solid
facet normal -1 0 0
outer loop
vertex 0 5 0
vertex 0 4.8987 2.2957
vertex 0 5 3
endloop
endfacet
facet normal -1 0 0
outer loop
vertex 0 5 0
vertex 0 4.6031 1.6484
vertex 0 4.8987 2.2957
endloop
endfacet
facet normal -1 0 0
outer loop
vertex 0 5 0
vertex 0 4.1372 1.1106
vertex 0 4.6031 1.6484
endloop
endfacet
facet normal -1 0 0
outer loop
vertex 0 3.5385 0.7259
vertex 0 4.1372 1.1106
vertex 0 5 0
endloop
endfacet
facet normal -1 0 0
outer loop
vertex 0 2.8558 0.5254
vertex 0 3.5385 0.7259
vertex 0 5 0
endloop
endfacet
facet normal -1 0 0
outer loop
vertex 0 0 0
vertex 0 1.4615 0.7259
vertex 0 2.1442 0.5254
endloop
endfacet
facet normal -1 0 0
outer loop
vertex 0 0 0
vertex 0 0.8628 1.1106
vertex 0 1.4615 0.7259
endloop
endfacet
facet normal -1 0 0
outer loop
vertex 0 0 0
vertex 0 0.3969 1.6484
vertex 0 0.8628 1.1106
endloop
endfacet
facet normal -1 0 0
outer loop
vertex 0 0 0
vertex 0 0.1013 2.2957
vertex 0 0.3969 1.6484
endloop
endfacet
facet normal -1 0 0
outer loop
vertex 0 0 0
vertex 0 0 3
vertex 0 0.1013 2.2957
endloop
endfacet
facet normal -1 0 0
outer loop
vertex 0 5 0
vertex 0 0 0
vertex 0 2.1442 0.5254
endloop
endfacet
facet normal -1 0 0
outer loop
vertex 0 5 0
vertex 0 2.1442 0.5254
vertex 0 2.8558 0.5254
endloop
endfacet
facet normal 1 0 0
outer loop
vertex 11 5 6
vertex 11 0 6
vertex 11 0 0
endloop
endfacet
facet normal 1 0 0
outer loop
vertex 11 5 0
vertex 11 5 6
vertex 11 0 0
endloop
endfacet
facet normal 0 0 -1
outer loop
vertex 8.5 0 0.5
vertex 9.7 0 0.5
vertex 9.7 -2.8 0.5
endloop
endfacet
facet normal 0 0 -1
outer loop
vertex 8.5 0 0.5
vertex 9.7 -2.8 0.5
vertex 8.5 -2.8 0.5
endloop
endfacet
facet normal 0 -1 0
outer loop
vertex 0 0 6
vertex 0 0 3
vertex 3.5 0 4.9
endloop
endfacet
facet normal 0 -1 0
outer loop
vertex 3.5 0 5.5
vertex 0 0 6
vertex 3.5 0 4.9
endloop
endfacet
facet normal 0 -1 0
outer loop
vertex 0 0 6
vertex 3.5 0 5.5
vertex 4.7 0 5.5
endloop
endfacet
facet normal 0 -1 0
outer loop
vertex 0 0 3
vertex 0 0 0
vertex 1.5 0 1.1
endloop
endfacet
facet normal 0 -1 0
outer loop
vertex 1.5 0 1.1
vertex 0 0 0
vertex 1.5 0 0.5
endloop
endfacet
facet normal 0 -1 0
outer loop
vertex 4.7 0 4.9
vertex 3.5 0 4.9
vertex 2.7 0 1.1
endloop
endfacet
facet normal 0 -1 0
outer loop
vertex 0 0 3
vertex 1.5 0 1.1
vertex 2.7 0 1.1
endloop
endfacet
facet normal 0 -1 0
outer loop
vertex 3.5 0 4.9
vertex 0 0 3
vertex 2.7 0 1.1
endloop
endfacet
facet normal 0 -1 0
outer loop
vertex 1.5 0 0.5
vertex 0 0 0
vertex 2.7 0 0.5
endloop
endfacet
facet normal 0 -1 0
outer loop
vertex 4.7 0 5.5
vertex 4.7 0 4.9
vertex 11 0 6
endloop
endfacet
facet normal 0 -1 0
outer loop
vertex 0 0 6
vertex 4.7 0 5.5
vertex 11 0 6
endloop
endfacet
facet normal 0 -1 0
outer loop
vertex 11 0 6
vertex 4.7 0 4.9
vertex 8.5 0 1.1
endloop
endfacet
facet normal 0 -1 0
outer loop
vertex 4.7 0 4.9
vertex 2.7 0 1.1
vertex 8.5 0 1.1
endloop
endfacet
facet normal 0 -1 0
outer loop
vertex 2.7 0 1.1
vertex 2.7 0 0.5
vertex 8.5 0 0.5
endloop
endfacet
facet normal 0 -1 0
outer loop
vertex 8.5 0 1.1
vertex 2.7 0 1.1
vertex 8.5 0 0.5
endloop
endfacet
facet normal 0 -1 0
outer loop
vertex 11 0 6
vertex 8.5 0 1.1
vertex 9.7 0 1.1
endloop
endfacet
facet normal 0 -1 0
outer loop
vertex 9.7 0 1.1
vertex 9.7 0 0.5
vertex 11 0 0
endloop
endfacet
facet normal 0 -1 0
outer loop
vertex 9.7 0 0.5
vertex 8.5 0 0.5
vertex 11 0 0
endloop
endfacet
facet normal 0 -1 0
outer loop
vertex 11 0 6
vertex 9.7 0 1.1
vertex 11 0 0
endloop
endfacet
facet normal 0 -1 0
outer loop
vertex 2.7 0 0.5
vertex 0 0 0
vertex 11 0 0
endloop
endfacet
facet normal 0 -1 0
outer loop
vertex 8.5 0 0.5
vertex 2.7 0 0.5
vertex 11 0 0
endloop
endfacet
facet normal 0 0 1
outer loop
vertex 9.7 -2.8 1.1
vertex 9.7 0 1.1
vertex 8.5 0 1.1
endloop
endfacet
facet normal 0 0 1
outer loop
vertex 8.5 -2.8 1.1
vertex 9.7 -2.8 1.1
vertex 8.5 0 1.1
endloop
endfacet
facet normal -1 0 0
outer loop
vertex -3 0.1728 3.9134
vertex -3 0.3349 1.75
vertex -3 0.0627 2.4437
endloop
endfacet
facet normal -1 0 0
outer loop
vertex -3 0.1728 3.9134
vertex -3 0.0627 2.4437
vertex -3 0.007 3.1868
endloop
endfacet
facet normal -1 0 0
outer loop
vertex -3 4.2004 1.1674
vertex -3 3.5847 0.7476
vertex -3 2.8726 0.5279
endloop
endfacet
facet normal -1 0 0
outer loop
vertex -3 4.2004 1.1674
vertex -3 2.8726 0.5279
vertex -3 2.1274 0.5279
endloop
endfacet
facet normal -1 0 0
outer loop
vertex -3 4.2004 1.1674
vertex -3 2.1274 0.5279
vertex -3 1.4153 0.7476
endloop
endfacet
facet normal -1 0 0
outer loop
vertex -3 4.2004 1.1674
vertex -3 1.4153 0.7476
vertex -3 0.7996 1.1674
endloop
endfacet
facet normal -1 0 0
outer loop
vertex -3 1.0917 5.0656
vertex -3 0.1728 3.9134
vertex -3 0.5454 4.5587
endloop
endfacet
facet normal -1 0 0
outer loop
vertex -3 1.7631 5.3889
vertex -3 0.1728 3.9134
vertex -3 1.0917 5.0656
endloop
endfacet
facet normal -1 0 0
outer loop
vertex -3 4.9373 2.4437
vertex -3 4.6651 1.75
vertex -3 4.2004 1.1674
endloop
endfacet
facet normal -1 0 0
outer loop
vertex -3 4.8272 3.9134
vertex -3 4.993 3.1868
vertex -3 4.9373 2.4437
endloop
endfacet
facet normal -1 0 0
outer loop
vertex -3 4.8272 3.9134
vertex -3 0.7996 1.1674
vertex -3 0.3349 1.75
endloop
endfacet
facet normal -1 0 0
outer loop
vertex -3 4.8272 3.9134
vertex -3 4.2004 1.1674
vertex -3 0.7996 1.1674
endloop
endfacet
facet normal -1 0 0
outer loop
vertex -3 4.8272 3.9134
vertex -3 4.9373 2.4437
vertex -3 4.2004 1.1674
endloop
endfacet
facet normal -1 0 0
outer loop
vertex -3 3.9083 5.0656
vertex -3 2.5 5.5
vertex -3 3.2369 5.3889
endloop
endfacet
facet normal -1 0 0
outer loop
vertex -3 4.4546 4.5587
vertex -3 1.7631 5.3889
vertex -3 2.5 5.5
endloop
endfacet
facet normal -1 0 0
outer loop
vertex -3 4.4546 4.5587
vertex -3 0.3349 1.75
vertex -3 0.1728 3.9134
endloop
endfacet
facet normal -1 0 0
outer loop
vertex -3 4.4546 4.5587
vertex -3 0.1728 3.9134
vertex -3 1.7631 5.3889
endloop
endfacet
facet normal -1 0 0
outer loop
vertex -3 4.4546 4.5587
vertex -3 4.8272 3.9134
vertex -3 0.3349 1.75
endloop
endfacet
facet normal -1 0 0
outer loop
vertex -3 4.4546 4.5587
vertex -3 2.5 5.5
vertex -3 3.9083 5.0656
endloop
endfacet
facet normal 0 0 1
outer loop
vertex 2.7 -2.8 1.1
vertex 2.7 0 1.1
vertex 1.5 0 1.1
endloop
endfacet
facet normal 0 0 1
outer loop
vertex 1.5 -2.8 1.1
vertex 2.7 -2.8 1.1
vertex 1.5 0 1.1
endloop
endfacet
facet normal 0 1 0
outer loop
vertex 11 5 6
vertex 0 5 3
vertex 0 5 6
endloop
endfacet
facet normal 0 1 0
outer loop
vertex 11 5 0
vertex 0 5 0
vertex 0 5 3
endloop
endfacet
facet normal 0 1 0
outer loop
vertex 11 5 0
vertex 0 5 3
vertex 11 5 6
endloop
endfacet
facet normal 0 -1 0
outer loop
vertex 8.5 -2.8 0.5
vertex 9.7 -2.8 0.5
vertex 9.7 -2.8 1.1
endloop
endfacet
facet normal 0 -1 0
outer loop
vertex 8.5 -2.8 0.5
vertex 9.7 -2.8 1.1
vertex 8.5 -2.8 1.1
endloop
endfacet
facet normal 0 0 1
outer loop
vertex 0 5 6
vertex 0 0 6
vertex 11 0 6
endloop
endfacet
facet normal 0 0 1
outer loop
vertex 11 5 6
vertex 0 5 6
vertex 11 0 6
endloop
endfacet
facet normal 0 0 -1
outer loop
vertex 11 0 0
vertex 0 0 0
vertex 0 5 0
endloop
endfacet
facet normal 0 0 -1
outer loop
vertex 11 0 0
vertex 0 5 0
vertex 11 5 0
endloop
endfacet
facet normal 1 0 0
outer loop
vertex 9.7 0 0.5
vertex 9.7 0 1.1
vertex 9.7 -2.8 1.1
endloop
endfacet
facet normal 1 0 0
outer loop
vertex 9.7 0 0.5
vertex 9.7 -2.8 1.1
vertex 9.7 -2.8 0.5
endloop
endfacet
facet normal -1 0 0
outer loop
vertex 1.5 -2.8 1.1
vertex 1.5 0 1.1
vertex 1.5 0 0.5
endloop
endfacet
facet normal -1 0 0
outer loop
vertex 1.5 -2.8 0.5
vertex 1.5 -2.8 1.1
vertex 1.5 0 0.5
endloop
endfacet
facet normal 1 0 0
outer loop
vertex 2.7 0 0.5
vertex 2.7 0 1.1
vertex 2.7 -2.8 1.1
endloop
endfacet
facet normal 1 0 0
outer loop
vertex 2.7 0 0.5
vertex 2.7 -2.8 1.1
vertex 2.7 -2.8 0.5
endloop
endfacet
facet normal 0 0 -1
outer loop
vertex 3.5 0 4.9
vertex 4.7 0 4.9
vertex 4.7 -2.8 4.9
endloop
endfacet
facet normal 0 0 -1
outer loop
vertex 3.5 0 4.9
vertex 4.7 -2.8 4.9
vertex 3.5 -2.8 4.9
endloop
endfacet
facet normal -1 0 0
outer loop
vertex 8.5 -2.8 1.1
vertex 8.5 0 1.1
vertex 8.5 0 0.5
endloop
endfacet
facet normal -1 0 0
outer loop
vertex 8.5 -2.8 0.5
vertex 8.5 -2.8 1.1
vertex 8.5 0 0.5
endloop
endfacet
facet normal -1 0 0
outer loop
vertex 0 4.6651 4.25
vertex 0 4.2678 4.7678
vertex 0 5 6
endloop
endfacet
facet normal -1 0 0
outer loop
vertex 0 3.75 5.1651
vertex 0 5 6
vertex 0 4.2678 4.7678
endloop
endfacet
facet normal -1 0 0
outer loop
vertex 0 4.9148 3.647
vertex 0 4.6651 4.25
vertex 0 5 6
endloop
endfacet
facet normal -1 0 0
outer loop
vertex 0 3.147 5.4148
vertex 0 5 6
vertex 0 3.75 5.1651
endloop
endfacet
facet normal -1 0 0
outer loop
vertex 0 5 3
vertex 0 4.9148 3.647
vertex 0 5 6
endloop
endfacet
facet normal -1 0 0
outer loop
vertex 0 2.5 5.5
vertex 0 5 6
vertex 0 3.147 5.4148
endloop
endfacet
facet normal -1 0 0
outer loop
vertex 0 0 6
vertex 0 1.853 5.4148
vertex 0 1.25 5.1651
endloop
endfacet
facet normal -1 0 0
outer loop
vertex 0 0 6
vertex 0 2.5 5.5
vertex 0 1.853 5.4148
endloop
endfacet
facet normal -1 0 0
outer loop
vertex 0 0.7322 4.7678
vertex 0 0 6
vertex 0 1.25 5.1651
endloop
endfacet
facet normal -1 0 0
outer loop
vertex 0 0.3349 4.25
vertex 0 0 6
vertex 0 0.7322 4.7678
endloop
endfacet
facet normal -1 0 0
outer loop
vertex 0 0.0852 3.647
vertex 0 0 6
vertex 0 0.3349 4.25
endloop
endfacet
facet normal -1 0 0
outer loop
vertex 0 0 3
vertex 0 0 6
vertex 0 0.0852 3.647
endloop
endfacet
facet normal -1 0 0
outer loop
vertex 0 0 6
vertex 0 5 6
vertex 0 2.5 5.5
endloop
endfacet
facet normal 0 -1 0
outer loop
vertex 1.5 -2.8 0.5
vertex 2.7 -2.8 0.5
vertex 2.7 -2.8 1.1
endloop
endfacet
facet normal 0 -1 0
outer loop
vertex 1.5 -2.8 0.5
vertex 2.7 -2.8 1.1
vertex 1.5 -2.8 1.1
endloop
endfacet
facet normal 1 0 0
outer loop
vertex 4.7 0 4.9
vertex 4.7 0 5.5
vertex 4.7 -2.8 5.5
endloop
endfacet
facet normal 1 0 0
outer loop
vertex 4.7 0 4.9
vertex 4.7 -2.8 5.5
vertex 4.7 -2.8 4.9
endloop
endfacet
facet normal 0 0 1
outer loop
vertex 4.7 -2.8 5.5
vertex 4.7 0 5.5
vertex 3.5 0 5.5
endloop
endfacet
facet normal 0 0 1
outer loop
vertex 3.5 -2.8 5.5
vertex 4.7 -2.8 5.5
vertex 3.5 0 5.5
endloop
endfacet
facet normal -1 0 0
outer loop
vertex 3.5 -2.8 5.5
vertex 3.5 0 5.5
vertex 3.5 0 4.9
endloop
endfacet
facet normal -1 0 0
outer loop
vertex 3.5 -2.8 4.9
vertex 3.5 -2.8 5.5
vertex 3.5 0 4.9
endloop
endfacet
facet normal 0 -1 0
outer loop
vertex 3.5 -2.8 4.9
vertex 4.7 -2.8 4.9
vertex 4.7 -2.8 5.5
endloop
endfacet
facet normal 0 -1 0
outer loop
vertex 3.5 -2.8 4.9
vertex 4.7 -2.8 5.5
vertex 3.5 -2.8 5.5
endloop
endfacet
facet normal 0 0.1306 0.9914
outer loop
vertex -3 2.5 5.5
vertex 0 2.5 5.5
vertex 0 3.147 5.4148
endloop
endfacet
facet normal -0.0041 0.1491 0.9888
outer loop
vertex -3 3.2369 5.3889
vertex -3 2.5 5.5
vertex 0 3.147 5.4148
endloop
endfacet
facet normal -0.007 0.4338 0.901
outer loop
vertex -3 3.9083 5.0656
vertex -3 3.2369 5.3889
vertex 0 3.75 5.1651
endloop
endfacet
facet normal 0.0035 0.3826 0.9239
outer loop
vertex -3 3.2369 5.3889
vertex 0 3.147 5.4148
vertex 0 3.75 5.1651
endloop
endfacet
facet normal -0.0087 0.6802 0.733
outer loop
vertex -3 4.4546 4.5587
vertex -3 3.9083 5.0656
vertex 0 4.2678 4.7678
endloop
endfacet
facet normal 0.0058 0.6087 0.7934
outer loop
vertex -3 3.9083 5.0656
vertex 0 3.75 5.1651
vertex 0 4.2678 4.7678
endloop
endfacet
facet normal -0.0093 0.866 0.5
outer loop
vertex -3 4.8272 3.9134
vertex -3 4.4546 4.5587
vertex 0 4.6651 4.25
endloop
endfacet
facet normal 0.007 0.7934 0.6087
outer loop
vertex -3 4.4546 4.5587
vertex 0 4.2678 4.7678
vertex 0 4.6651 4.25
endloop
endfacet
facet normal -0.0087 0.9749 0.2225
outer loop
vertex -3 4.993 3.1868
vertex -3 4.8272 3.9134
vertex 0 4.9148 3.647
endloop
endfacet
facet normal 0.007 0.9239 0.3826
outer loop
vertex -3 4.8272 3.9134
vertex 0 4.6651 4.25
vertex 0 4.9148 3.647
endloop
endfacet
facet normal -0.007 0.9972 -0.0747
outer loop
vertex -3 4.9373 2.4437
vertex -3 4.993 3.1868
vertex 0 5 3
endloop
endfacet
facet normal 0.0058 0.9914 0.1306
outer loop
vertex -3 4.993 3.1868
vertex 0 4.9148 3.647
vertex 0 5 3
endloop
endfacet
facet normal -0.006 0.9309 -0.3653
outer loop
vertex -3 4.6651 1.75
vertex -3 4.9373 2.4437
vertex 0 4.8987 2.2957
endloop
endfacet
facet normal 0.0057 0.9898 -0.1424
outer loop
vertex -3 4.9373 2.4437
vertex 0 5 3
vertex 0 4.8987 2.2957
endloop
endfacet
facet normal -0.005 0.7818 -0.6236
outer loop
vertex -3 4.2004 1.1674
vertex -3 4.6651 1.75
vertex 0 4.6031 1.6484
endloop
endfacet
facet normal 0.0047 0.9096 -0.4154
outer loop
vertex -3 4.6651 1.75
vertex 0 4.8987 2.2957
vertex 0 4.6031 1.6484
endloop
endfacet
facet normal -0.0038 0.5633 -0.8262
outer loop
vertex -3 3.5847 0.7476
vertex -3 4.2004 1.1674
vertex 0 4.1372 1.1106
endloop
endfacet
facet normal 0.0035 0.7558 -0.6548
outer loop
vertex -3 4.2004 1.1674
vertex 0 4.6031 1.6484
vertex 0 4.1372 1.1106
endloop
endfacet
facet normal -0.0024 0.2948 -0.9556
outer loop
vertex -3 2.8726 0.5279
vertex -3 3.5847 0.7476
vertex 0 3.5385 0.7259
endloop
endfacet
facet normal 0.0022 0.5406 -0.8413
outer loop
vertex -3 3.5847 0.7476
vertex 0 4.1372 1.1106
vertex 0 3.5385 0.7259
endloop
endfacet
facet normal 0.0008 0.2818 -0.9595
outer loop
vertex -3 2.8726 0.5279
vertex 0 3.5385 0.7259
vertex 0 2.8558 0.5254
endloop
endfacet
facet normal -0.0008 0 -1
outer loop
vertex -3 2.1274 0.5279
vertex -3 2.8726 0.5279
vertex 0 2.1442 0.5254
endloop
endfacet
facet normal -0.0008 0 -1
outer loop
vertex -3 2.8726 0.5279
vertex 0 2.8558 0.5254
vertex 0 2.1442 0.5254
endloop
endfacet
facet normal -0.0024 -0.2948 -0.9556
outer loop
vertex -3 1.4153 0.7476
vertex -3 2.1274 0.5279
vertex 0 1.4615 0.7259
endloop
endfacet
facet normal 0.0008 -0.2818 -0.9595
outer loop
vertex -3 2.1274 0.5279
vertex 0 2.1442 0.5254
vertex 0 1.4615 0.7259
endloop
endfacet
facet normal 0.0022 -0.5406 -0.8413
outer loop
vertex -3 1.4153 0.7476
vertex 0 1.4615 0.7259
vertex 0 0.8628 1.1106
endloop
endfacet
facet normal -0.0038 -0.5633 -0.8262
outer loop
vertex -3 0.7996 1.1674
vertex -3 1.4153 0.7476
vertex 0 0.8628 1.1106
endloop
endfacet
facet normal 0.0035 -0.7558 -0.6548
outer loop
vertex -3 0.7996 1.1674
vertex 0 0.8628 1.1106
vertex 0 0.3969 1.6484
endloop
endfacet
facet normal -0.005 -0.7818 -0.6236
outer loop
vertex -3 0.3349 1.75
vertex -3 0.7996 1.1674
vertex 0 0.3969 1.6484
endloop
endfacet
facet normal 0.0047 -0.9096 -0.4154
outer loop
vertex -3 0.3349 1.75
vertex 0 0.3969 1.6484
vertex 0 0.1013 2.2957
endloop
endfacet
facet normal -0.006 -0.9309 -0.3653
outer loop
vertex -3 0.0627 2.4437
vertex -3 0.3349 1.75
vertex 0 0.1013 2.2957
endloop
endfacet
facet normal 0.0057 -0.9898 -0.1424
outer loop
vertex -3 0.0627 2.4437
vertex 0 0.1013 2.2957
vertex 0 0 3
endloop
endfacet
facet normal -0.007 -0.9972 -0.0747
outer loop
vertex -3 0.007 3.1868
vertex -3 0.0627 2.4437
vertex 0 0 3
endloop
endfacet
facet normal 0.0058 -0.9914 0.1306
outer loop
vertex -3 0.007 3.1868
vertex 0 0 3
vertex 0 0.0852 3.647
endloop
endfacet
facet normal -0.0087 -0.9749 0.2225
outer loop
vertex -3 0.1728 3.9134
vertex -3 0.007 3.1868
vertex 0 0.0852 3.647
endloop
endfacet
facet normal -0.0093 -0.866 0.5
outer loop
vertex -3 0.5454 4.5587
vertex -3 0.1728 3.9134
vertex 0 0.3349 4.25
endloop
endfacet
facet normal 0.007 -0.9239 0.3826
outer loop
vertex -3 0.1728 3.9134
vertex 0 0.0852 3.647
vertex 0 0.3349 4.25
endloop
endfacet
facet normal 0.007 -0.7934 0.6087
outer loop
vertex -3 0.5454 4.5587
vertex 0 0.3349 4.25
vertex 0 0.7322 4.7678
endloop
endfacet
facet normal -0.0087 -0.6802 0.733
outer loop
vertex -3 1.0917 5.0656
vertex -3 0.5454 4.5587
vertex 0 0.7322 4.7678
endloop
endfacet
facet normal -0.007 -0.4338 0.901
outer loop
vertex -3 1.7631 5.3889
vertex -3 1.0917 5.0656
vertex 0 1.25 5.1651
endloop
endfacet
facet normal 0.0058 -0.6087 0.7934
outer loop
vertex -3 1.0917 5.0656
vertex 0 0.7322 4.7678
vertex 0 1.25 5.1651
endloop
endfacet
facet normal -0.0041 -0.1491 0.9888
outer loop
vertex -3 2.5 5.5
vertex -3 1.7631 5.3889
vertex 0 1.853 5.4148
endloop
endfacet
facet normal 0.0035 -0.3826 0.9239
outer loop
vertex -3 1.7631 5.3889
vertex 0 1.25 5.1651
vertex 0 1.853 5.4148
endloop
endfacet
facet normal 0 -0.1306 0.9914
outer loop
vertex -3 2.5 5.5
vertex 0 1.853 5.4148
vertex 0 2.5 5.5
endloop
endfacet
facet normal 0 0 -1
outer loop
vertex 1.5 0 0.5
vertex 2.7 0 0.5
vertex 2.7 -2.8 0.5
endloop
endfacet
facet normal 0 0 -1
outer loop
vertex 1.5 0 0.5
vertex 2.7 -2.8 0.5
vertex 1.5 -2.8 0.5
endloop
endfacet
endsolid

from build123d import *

# Parameters (mm, degrees)
SKETCH1_W           = 11
SKETCH1_H           = 6
BOSS_EXTRUDE1_DEPTH = 5
SKETCH2_R           = 2.5
BOSS_EXTRUDE2_DEPTH = 3
SKETCH3_W           = 1.2
SKETCH3_H           = 0.6
BOSS_EXTRUDE3_DEPTH = 2.8


with BuildPart() as part:
    # Sketch1 → Boss-Extrude1 (new body)
    with BuildSketch(Plane(origin=(0, 0, 0), x_dir=(1, 0, 0), z_dir=(0, 1, 0))):
        with Locations((5.5, -3)):
            Rectangle(SKETCH1_W, SKETCH1_H)
    extrude(amount=BOSS_EXTRUDE1_DEPTH)

    # Sketch2 → Boss-Extrude2 (add)
    with BuildSketch(Plane.ZY):
        with Locations((3, 2.5)):
            Circle(SKETCH2_R)
    extrude(amount=BOSS_EXTRUDE2_DEPTH)

    # Sketch3 → Boss-Extrude3 (add)
    with BuildSketch(Plane(origin=(0, 0, 0), x_dir=(-1, 0, 0), z_dir=(0, -1, 0))):
        with Locations((-2.1, -0.8)):
            Rectangle(SKETCH3_W, SKETCH3_H)
        with Locations((-9.1, -0.8)):
            Rectangle(SKETCH3_W, SKETCH3_H)
        with Locations((-4.1, -5.2)):
            Rectangle(SKETCH3_W, SKETCH3_H)
    extrude(amount=BOSS_EXTRUDE3_DEPTH)


solid = part.part
